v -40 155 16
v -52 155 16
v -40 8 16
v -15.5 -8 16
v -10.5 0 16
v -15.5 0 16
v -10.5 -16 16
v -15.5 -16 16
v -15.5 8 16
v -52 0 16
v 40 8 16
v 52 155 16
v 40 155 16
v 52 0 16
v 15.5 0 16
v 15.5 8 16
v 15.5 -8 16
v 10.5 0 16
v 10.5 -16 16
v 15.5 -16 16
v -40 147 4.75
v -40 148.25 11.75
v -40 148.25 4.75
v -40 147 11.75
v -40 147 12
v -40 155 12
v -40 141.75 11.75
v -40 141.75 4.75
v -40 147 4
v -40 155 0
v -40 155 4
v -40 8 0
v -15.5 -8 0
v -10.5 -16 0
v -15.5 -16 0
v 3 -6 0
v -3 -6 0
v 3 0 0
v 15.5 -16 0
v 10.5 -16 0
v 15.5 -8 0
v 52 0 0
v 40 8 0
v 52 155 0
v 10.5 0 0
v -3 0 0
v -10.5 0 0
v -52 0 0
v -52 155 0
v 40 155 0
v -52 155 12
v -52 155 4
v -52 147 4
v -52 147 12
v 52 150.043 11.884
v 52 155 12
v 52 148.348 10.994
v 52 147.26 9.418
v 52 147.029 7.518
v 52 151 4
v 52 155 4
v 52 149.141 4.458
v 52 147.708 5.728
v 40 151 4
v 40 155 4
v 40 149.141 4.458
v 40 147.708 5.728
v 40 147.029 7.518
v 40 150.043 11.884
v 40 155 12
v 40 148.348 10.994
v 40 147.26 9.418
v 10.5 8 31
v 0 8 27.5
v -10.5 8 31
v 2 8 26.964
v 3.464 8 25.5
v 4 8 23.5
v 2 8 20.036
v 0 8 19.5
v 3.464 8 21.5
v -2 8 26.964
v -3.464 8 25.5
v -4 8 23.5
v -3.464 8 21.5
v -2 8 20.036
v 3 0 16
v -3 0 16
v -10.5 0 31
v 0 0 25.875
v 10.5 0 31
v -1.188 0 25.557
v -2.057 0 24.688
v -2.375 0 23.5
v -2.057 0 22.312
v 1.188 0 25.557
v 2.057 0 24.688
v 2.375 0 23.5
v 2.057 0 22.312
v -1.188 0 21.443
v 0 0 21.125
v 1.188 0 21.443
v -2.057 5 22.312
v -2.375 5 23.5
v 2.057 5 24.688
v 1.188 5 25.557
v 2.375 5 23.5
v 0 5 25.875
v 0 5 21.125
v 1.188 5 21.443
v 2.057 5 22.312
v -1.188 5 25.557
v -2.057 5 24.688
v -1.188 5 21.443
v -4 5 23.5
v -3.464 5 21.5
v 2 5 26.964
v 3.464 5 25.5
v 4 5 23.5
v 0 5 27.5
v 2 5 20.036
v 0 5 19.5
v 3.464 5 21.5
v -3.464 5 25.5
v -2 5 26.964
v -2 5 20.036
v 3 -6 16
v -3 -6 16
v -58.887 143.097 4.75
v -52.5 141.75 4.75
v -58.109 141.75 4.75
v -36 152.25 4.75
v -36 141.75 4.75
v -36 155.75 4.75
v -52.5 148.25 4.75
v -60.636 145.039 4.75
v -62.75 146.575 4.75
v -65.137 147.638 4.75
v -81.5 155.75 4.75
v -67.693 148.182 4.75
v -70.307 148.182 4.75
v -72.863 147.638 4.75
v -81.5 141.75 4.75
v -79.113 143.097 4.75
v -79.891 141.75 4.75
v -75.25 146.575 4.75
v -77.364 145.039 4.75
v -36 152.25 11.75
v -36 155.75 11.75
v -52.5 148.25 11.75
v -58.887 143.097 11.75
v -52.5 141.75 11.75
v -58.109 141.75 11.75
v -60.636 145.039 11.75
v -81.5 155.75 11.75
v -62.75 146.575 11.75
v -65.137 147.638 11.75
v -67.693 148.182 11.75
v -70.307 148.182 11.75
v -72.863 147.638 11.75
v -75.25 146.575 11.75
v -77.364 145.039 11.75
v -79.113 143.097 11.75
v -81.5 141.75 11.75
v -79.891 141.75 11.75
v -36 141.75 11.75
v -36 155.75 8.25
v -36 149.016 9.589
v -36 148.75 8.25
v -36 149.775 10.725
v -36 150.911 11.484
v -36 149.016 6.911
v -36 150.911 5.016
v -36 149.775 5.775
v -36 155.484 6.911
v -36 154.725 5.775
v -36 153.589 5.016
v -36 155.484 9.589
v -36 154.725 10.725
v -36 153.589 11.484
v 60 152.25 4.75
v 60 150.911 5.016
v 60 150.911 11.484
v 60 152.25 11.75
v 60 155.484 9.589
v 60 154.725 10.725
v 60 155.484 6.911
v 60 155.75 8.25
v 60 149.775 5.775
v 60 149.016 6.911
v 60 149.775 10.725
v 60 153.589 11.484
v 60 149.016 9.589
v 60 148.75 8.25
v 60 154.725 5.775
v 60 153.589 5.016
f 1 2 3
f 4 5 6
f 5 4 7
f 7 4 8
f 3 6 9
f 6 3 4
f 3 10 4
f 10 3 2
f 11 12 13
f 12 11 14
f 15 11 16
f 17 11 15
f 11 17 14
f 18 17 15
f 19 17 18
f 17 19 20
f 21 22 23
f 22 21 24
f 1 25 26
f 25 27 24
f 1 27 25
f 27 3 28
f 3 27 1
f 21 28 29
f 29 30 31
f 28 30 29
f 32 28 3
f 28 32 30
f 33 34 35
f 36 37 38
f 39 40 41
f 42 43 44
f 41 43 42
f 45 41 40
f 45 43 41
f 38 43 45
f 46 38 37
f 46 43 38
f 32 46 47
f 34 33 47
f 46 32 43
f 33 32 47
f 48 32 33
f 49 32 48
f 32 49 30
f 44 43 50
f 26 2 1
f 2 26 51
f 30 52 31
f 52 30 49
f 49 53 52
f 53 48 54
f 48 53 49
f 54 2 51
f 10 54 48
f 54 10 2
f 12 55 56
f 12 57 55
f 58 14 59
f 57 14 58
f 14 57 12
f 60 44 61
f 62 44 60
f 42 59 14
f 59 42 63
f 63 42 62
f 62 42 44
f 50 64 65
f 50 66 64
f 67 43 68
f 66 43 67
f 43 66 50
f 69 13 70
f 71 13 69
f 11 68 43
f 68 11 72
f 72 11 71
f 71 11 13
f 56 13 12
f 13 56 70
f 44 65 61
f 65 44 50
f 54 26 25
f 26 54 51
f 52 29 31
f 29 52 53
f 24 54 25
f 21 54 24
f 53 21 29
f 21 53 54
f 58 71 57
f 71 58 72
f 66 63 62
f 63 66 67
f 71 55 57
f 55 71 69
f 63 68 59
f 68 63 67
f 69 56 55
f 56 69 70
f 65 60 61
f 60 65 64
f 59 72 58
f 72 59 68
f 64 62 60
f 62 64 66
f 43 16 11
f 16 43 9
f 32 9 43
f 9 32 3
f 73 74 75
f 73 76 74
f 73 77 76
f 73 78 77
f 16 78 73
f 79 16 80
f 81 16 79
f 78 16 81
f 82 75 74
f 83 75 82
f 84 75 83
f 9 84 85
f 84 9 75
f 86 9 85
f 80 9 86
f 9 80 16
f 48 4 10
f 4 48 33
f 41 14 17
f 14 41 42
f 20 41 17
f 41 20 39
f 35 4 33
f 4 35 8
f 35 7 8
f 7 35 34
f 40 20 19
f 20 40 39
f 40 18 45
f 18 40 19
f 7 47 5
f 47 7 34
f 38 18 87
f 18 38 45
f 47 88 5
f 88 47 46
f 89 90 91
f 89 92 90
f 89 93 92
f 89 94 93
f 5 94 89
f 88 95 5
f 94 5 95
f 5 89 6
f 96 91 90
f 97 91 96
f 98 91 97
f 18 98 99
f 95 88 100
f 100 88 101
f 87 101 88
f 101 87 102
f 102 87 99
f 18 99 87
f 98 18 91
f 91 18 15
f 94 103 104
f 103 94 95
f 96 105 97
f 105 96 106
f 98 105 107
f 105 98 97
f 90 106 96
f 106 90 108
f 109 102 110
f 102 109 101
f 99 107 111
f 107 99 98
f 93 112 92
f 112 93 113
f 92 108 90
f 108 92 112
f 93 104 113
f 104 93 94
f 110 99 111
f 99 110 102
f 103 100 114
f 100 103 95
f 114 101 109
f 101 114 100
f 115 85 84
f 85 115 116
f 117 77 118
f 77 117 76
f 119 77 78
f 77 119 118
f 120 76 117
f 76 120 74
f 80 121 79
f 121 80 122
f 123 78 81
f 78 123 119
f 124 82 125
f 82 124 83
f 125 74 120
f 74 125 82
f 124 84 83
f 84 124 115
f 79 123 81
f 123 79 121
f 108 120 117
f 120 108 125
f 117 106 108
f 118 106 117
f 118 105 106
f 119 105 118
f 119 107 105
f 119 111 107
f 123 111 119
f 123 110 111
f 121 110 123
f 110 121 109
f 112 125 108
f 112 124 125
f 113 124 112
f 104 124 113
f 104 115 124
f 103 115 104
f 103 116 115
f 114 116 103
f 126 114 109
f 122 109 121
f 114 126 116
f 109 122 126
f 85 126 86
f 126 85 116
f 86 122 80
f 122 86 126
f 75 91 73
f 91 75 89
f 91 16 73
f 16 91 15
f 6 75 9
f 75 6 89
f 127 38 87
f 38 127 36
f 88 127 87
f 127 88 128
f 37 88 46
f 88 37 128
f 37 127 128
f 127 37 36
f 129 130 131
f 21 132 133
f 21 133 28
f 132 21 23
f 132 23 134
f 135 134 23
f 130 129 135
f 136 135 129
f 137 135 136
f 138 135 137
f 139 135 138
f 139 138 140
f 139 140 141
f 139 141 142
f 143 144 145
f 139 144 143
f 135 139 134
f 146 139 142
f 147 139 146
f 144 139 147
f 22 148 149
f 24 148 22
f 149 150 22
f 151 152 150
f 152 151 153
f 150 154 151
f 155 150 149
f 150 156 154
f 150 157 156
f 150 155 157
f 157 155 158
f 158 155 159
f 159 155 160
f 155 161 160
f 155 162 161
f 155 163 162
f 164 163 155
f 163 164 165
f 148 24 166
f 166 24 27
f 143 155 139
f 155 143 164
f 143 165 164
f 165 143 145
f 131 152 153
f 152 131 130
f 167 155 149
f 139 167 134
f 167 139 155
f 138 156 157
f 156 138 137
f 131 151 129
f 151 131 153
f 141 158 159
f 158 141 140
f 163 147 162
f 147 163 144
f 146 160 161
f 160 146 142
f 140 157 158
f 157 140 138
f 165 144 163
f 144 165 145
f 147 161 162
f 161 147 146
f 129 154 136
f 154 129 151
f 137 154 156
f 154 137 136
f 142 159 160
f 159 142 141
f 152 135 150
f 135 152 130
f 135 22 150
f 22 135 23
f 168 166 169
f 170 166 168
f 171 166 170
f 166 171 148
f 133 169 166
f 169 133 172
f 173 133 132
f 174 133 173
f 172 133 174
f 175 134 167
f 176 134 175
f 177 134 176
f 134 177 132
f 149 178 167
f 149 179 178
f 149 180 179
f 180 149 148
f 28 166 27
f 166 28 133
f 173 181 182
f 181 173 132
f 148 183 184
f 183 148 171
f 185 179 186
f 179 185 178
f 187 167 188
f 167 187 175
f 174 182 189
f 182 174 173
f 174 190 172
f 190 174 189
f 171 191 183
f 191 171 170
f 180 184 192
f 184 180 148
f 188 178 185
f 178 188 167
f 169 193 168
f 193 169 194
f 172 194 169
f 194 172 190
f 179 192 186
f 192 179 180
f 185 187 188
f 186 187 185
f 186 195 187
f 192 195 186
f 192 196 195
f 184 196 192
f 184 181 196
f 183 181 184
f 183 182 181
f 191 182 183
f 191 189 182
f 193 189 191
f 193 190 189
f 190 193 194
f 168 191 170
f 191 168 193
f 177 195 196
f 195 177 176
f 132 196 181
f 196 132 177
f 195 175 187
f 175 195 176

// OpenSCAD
/* https://www.thingiverse.com/thing:2102678 */

// Current part display
part = "both"; // [both:Both, holder:Holder, rod:Rod]

// Should we offset the mount part?
mount_center_offset = 0; // [-50:50]

// Thickness (Y-wise) of the arms
arm_thickness = 12;
// Width (X-wise) of the arms
arm_width     = 16;

// Maximum width of a roll to fit between the arms
roll_width = 80;
// Maximum diameter of a roll to account for
roll_diameter = 200;
// The biggest roll center hole to account for
roll_hole_diameter = 60;

// Support rod diameter
rod_diameter = 7.5;

// How far down will the slanted support reach?
// 0.0 disables it, 1.0 will reach all the way down.
mount_support_height_ratio = 0.5;

/* [Hidden] */

rod_support_thickness = 4;
rod_clearance = 8; // Extra width on the rod

// 2020 aluminum bar
bar_width = 20 + 1;
bar_center_width = 6; // The center hole

base_height = 8;     // The "floor" between the arms
mount_thickness = 5; // The thickness of the prongs
mount_height = 16;

// Screw hole
mount_hole_diameter  = 4.0 + 0.75;
// Screw well
mount_hole_well = 8.0;


clearance_margin = 25;
minimum_clearance = (roll_diameter + roll_hole_diameter)/2 + clearance_margin;

output_part();

// Creates two mirrored arms with the given distance, height and thickness
module holder_arms(arm_separation, arm_width, arm_thickness, arm_height) {
    module single_arm() {
        translate([arm_separation/2, 0])
            cube([arm_thickness, arm_height, arm_width]);
    }
    union() {
        mirror() single_arm();
                 single_arm();
    }
}

// Roll holder
module roll_holder() {
    difference() {
        holder_arms(roll_width, arm_width, arm_thickness, minimum_clearance);
        
        r_d = rod_diameter + 0.5; // Adjust fit a bit
        
        // Left cube slot
        translate([-roll_width/2-arm_thickness - 1, minimum_clearance-r_d, (arm_width-r_d)/2])
            cube([arm_thickness+2, r_d, r_d]);
        
        // Right cylinder slot
        hull() {
            
            translate([roll_width/2-1, minimum_clearance, (arm_width-r_d)/2])
                cube([arm_thickness+2, r_d, r_d]);
            translate([roll_width/2-1, minimum_clearance-(r_d/2), (arm_width)/2])
                rotate([0, 90,0]) cylinder(d=r_d, h=arm_thickness+2);
        }
    }
    
    mount_bot_w = bar_width + mount_thickness*2;
    mount_bot_hull_h = mount_height * mount_support_height_ratio;
    // Bottom structure
    difference() {
        union() {
            hull() {
                // Center base "floor"
                translate([0, base_height/2, arm_width/2])
                    cube([roll_width + arm_thickness*2, base_height, arm_width], center=true);
                // The end piece for slanted supports
                translate([-mount_bot_w/2 + mount_center_offset, -mount_bot_hull_h, 0])
                    cube([mount_bot_w, mount_bot_hull_h, arm_width]);
            }
            
            // Full-size end piece for prongs
            translate([-mount_bot_w/2 + mount_center_offset, -mount_height, 0])
                    cube([mount_bot_w, mount_height, arm_width]);
        }
        
        // Remove 2020 (fudged a bit for clean previews)
        translate([-bar_width/2 + mount_center_offset, -bar_width-1, -1])
                cube([bar_width, bar_width+1, arm_width+2]);
    }
    
    translate([mount_center_offset, 0]) {
        // Center plug for mount
        translate([-bar_center_width/2, -bar_center_width])
            cube([bar_center_width, bar_center_width, arm_width]);
        
        // Mount lip
        translate([0,0, arm_width]) {
            lip_w1 = mount_bot_w;
            lip_w2 = bar_width;
            lip_l  = 15;
            difference() {
                hull() {
                    // Base
                    translate([-lip_w1/2, 0, -arm_width]) cube([lip_w1, base_height, arm_width]);
                    // End
                    translate([-lip_w2/2, 0, lip_l-1]) cube([lip_w2, base_height, 1]);
                }
                // Screw hole
                translate([0, base_height, lip_l/2]) rotate([90,0,0]) {
                    cylinder(d=mount_hole_diameter, h=base_height+1, $fn=12);
                    translate([0,0,-1]) cylinder(d=mount_hole_well, h=3+1, $fn=12);
                }
            }
        }
    }
}

module roll_rod() {
    // Make the slot fit better
    spacing = 0.5;
    p_h = rod_diameter - spacing;
    // Center piece
    translate([-spacing, -p_h/2])
        cube([arm_thickness+spacing, rod_diameter, p_h]);
    
    // Back prong
    translate([-rod_support_thickness-spacing, -p_h/2])
            cube([rod_support_thickness, p_h*2, p_h]);
    // Front prong
    translate([arm_thickness, -p_h/2])
            cube([rod_support_thickness, p_h*2, p_h]);
    
    // Handle
    handle_w = 25;
    translate([-handle_w-spacing-rod_support_thickness, -p_h/2]) difference() {
        cube([handle_w, p_h*2, p_h]);
        translate([handle_w/2, p_h*2+6, -1]) cylinder(d=25, h=p_h+2);
    }
    
    // Cyl
    translate([arm_thickness, 0, p_h/2])
        rotate([0,90,0]) cylinder(d=p_h, h=roll_width + arm_thickness + rod_clearance, $fn=16);
}
//part="rod";
module output_part() {
    if (part == "both") {
        roll_holder();
        
        translate([0, minimum_clearance-(rod_diameter/2) + 1, (arm_width)/2])
            translate([-roll_width/2 - arm_thickness, 0,0]) rotate([180,0,0])
            translate([0,0,-rod_diameter/2]) color("red") roll_rod();
    } else if (part == "holder") {
        roll_holder();
    } else if (part == "rod") {
        roll_rod();
    }
}
